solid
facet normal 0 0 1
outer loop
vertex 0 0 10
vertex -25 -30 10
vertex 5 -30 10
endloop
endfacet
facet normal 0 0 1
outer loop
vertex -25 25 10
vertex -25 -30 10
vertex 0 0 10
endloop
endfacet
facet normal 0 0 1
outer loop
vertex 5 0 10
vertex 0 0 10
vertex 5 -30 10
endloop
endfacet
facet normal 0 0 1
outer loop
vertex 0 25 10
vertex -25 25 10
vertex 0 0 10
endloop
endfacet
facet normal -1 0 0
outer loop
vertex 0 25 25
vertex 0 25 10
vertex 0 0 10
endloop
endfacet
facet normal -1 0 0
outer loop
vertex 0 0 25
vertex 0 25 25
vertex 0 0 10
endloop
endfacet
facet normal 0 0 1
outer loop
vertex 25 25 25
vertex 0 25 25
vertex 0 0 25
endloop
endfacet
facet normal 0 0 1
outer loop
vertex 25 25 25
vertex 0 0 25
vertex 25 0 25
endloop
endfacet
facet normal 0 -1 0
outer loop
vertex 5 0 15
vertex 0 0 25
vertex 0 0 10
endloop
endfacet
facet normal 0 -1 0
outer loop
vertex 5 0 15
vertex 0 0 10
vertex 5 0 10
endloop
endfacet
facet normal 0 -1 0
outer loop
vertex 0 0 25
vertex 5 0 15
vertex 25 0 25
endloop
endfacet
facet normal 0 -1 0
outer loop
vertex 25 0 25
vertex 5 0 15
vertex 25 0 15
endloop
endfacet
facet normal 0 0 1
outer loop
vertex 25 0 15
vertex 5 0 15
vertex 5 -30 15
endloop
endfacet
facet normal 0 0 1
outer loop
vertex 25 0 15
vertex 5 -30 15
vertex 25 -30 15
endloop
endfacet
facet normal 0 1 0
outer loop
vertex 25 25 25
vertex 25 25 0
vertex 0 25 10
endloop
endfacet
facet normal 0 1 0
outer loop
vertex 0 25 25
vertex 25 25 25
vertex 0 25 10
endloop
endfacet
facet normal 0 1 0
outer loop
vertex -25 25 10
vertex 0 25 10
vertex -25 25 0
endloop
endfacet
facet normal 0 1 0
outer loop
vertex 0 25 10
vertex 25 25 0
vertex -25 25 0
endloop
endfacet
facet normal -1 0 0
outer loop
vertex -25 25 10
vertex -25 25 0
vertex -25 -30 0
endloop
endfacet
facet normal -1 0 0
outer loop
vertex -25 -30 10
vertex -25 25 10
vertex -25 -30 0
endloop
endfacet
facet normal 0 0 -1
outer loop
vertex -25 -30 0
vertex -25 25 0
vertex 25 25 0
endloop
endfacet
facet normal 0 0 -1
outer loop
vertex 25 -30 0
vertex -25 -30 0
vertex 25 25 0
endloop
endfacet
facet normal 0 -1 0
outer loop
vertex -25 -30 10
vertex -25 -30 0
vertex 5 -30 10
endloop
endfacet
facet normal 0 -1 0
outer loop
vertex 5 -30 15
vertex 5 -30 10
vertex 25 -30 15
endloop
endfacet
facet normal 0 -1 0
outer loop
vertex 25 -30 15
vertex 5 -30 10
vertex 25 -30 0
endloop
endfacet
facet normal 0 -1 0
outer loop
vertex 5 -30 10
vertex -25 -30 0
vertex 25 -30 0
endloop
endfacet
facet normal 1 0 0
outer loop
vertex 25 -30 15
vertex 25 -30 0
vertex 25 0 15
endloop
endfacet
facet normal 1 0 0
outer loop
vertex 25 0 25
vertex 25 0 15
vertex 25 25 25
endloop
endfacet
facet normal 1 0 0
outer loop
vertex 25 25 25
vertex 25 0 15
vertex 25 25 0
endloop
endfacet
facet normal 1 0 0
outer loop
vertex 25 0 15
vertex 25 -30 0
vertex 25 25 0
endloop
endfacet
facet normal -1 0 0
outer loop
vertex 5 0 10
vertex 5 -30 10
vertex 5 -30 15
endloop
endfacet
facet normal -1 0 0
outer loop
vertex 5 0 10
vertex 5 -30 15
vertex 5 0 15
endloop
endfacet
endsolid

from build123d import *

# Parameters (mm, degrees)
F1_DEPTH = 25
F2_DEPTH = 10
F0_W     = 20
F0_H     = 30
F3_DEPTH = 15


with BuildPart() as f1:
    # F0 (on Top) → F1 (new body)
    with BuildSketch(Plane.XY):
        Polygon((0, 25), (0, 0), (5, 0), (25, 0), (25, 25), align=None)
    extrude(amount=F1_DEPTH)

    # F0 (on Top) → F2 (join)
    with BuildSketch(Plane.XY):
        Polygon((5, 0), (0, 0), (0, 25), (-25, 25), (-25, -30), (5, -30), align=None)
    extrude(amount=F2_DEPTH)

    # F0 (on Top) → F3 (join)
    with BuildSketch(Plane.XY):
        with Locations((15, -15)):
            Rectangle(F0_W, F0_H)
    extrude(amount=F3_DEPTH)


solid = f1.part
